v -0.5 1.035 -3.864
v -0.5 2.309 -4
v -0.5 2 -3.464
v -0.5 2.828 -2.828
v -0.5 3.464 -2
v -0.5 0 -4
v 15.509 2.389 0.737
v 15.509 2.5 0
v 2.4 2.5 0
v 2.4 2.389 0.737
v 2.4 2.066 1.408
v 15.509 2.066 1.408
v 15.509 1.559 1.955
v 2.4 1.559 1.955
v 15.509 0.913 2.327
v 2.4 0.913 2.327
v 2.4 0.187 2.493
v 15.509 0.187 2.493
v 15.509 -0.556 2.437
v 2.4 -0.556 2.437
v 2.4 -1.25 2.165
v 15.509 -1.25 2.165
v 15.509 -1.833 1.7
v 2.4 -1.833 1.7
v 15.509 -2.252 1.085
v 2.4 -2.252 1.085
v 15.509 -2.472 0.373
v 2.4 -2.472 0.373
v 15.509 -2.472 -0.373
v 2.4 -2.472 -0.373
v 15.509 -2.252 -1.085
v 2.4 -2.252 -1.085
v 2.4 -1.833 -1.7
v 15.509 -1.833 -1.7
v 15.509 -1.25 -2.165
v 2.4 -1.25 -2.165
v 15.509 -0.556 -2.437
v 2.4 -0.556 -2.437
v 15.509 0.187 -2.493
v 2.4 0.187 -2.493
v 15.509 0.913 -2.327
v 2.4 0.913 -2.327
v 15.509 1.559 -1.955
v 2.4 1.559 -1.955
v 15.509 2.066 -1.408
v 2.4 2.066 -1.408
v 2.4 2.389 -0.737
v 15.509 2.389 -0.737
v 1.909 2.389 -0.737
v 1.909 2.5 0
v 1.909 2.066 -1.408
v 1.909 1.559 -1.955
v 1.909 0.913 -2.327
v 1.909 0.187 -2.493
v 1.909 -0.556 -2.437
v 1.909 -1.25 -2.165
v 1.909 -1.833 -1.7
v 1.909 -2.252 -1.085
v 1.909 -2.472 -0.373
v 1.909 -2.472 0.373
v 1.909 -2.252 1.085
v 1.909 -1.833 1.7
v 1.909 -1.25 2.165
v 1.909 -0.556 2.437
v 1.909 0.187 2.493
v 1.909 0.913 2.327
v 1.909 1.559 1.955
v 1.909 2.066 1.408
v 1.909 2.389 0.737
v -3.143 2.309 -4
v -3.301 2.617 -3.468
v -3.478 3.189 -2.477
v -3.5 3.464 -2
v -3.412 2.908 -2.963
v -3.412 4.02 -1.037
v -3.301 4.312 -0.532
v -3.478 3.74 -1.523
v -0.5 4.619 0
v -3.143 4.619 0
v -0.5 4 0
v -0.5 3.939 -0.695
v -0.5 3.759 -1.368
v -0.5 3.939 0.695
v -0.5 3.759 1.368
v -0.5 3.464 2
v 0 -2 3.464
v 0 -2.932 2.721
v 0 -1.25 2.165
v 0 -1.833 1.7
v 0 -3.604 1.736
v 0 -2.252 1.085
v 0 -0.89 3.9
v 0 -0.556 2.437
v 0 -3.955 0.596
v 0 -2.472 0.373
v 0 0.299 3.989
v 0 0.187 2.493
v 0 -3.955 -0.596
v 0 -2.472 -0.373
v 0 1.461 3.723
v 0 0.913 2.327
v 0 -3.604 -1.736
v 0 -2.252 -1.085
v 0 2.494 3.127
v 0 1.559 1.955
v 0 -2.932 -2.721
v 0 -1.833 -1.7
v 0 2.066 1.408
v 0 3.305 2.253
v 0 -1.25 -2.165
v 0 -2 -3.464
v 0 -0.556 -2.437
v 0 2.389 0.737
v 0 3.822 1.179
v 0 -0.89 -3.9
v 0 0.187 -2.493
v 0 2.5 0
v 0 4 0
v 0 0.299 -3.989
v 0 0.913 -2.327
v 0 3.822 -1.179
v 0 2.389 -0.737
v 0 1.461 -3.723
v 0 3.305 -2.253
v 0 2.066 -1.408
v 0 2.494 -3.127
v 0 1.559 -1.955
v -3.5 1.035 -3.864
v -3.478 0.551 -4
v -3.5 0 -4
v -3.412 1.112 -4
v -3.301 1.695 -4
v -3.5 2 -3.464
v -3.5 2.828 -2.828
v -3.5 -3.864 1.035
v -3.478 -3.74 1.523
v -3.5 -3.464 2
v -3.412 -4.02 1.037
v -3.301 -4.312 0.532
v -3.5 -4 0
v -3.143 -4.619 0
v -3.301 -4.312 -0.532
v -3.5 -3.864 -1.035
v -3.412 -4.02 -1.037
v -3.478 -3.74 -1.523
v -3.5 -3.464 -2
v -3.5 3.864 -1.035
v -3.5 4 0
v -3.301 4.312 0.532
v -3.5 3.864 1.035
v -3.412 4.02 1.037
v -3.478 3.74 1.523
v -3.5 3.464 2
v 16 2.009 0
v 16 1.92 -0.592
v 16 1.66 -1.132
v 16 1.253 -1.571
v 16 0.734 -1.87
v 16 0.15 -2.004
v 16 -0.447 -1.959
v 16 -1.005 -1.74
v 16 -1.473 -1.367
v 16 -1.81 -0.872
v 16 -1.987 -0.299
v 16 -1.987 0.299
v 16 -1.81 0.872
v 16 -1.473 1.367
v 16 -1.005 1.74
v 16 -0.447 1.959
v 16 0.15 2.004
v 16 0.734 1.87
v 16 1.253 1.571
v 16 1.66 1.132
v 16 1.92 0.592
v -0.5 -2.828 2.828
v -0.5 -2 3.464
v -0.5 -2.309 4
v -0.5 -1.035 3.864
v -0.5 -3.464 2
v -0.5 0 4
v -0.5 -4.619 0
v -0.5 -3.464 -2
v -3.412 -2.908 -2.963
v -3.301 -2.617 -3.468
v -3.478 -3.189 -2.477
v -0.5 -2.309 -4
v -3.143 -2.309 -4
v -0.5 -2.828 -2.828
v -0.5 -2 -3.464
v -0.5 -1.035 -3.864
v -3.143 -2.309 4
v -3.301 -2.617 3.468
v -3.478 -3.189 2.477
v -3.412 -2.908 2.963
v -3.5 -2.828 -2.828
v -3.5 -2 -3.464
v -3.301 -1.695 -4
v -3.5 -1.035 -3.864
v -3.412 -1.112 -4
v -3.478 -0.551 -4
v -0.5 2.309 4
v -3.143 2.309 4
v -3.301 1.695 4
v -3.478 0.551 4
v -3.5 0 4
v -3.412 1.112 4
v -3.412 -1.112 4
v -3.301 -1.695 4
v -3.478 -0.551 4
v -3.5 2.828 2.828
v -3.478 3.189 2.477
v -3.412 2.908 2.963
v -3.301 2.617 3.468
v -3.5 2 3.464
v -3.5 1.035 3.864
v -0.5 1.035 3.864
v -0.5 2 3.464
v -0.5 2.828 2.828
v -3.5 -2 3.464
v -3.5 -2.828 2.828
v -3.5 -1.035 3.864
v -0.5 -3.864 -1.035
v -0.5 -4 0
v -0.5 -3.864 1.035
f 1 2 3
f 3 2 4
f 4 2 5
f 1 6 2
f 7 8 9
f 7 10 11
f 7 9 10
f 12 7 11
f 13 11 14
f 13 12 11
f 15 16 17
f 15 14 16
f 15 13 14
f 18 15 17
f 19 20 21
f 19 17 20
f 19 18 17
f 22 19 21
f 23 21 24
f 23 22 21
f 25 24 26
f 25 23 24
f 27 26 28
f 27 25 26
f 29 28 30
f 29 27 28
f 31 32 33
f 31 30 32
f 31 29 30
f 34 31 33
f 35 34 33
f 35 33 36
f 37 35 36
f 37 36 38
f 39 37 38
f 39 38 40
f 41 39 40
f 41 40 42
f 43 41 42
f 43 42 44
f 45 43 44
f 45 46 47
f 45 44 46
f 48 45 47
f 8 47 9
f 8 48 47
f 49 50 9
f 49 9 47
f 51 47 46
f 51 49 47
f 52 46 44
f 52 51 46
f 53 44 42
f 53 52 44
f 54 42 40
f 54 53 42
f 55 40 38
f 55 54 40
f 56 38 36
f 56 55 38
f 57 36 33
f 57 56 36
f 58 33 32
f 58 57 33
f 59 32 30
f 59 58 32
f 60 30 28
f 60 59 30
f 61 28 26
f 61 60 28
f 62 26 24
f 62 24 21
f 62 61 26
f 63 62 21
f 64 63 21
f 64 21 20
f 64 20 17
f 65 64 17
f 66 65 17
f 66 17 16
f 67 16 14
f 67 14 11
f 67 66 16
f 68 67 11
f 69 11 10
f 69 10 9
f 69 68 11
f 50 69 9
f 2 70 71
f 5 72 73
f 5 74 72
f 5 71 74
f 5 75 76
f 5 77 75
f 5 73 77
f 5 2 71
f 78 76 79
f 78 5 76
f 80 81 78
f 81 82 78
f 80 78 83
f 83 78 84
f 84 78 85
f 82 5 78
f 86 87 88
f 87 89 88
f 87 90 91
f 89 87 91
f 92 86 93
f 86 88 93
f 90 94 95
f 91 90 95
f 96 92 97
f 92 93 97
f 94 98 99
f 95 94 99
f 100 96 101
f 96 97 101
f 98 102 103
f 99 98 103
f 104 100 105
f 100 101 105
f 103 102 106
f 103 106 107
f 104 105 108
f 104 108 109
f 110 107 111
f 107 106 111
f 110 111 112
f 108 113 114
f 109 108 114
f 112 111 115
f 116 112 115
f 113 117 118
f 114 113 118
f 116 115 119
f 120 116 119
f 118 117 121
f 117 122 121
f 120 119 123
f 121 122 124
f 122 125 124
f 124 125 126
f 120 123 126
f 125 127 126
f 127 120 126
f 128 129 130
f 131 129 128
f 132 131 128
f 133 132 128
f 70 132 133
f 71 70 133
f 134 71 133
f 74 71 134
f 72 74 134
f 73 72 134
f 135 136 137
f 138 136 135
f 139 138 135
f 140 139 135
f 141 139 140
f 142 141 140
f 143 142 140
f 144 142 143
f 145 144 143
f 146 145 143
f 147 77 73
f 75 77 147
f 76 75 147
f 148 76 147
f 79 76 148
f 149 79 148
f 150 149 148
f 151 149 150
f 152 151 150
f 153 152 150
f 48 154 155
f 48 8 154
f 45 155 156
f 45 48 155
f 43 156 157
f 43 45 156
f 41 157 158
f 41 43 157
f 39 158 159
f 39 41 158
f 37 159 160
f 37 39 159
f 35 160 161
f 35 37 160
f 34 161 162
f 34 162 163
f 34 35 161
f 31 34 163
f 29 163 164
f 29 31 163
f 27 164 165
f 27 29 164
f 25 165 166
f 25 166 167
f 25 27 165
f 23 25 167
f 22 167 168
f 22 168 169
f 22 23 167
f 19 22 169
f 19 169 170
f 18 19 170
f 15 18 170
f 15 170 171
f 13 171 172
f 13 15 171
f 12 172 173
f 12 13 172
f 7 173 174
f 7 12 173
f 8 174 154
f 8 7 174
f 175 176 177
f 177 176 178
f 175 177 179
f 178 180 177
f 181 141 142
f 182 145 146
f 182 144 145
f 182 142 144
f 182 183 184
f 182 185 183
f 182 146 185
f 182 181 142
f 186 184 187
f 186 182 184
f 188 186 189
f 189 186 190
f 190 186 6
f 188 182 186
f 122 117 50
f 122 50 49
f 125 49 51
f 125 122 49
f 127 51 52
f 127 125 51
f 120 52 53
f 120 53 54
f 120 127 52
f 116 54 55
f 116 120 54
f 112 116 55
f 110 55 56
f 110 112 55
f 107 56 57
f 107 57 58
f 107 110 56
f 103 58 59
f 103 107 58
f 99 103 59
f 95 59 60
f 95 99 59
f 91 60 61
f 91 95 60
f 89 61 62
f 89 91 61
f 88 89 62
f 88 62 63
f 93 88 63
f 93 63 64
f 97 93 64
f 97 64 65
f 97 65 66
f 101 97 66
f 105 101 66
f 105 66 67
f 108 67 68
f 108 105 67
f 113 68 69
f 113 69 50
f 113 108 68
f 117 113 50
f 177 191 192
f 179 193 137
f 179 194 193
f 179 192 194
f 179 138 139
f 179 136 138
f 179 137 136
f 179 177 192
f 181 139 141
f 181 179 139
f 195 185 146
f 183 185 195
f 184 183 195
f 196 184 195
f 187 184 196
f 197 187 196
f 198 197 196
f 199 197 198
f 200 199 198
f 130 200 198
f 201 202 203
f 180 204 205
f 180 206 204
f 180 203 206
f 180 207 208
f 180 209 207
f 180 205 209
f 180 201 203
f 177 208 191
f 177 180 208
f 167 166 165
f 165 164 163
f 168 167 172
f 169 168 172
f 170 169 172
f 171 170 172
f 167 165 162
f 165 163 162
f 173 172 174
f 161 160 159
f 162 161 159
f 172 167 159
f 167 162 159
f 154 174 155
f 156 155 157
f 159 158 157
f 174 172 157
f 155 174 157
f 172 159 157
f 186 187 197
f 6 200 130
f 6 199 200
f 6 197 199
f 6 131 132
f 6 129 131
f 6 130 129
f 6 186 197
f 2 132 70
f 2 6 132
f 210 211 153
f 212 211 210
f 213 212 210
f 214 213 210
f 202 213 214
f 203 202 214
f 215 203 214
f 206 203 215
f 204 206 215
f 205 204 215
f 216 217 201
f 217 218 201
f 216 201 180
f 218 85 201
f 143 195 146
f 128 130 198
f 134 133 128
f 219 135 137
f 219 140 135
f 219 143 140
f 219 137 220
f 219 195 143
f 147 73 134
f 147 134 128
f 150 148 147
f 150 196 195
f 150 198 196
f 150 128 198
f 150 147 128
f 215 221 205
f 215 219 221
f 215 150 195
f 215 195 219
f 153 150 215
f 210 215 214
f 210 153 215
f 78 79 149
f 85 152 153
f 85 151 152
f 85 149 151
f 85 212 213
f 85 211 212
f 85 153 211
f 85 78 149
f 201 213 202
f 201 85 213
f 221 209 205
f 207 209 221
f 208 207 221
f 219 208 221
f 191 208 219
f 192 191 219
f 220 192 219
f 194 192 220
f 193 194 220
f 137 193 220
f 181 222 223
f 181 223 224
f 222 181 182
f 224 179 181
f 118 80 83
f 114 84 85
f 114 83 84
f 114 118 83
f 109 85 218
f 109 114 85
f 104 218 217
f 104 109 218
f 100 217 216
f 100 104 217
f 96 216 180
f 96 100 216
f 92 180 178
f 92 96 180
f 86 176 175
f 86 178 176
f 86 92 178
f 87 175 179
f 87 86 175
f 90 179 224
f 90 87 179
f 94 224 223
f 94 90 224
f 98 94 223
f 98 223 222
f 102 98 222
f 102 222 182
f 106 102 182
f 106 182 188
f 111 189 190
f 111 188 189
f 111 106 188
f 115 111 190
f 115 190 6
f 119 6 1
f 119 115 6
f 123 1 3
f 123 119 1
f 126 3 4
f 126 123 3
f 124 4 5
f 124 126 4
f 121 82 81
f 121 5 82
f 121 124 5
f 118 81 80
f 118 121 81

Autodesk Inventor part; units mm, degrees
ref_plane "YZ Plane" through (0, 0, 0) normal (1, 0, 0) x (0, 1, 0)
ref_plane "XZ Plane" through (0, 0, 0) normal (0, 1, 0) x (-1, 0, 0)
sketch "Sketch1" plane through (0, 0, 0) normal (0, 0, 1) x (1, 0, 0)
  line L0 (0, 4) -> (0, 2.5)
  line L1 (2.4, 2.5) -> (16, 2.5)
  line L2 (16, 2.5) -> (16, 0)
  line L3 (16, 0) -> (-0.5001, 0)
  line L4 (-3.8001, 0) -> (19.3, 0) projected
  line L5 (-0.5001, 0) -> (-0.5001, 4)
  line L6 (-0.5001, 4) -> (0, 4)
  line L7 (2.4, 2.5) -> (1.9091, 2.5)
  line L8 (1.9091, 2.5) -> (0, 2.5)
  line L9 (0, -0.8) -> (0, 4.8) projected
  dimension "d0" = 16
  dimension "d1" = 13.6
  dimension "d2" = 5
  dimension "d9" = 0.5001
  dimension "d10" = 8
  dimension "d13" = 0.4909
  dimension "d14" = 5
revolve "Body" add sketch "Sketch1" angle 360 about axis through (16, 0, 0) along (-1, 0, 0)
sketch "Sketch2" plane through (-0.5001, 0, 0) normal (-1, 0, 0) x (0, 0, 1)
  line L0 (0, 4.6188) -> (4, 2.3094)
  line L1 (4, 2.3094) -> (4, -2.3094)
  line L2 (4, -2.3094) -> (0, -4.6188)
  line L3 (0, -4.6188) -> (-4, -2.3094)
  line L4 (-4, -2.3094) -> (-4, 2.3094)
  line L5 (-4, 2.3094) -> (0, 4.6188)
  point P0 (0, 0)
  point P1 (0, 0)
  dimension "d11" = 8
extrude "Head" add sketch "Sketch2" along normal blind 3
sketch "Sketch4" plane through (0, 0, 0) normal (0, 0, 1) x (1, 0, 0)
  line L0 (-3.5001, 4) -> (-3.5001, 4.6188)
  line L1 (-3.5001, 4.6188) -> (-3.1428, 4.6188)
  line L2 (-3.1428, 4.6188) -> (-3.5001, 4)
  line L3 (-4.1001, 0) -> (0.0999, 0) projected
  line L4 (-0.5001, 4.6188) -> (-3.5001, 4.6188) projected
  line L5 (-3.5001, 2.3094) -> (-3.5001, 4.6188) projected
  dimension "d5" = 30
  dimension "d19" = 8
revolve "Chamfer1" cut sketch "Sketch4" angle 360 about axis through (-10, 0, 0) along (1, 0, 0)
thread "Thread" size "M5x0.8" class "6g" standard "ISO Metric profile" length 13.6
chamfer "Chamfer2" distance 0.4908 distance2 0.4909 1 edges at (16, -2.5, 0) measured on face at (16, 0.6587, 0.3326)
ref_plane "Work Plane1" through (1.525, 0, 0) normal (0, 0, 1) x (1, 0, 0)
equation "\"d0\" = NLG"
equation "\"d1\" = GEL"
equation "\"d2\" = GD"
equation "\"d10\" = SD2"
equation "\"d14\" = BDM"
equation "\"d11\" = SW"
equation "\"d3\" = KOH - SD"
equation "\"d5\" = ANG1"
equation "\"d19\" = SW0"
equation "\"d15\" = GEL"
equation "\"d6\" = -0.5 * SPD + 0.5 * GD"
equation "\"NLG\" = 16"
equation "\"GD\" = NND"
equation "\"BDM\" = NND"
equation "\"KOH\" = 3.5"
equation "\"GEL\" = 13.6"
equation "\"SW\" = 8"
equation "\"SW0\" = SW"
equation "\"SPD\" = NND - 1.2269 * PTC"
equation "\"SD2\" = SW"
equation "\"SD\" = 0.5"
equation "\"ANG1\" = 30deg"
equation "\"GAL\" = 0.61345 * PTC"
equation "\"GUL\" = 0.61345 * PTC"
equation "\"RR\" = 0.2"
equation "\"WFT\" = SD"
equation "\"GD1\" = THREADDIA - 1.2269 * PTC"
equation "\"THREADDIA\" = 5"
equation "\"SDH\" = SW"
equation "\"TOA\" = 30deg"
equation "\"FAWI\" = 45deg"
equation "\"PTC\" = 0.8"
equation "\"NND\" = 5"
equation "\"E0\" = 1.155 * SW"
properties part number "AS 1110 - M5 x 16" material "Steel, Mild"
